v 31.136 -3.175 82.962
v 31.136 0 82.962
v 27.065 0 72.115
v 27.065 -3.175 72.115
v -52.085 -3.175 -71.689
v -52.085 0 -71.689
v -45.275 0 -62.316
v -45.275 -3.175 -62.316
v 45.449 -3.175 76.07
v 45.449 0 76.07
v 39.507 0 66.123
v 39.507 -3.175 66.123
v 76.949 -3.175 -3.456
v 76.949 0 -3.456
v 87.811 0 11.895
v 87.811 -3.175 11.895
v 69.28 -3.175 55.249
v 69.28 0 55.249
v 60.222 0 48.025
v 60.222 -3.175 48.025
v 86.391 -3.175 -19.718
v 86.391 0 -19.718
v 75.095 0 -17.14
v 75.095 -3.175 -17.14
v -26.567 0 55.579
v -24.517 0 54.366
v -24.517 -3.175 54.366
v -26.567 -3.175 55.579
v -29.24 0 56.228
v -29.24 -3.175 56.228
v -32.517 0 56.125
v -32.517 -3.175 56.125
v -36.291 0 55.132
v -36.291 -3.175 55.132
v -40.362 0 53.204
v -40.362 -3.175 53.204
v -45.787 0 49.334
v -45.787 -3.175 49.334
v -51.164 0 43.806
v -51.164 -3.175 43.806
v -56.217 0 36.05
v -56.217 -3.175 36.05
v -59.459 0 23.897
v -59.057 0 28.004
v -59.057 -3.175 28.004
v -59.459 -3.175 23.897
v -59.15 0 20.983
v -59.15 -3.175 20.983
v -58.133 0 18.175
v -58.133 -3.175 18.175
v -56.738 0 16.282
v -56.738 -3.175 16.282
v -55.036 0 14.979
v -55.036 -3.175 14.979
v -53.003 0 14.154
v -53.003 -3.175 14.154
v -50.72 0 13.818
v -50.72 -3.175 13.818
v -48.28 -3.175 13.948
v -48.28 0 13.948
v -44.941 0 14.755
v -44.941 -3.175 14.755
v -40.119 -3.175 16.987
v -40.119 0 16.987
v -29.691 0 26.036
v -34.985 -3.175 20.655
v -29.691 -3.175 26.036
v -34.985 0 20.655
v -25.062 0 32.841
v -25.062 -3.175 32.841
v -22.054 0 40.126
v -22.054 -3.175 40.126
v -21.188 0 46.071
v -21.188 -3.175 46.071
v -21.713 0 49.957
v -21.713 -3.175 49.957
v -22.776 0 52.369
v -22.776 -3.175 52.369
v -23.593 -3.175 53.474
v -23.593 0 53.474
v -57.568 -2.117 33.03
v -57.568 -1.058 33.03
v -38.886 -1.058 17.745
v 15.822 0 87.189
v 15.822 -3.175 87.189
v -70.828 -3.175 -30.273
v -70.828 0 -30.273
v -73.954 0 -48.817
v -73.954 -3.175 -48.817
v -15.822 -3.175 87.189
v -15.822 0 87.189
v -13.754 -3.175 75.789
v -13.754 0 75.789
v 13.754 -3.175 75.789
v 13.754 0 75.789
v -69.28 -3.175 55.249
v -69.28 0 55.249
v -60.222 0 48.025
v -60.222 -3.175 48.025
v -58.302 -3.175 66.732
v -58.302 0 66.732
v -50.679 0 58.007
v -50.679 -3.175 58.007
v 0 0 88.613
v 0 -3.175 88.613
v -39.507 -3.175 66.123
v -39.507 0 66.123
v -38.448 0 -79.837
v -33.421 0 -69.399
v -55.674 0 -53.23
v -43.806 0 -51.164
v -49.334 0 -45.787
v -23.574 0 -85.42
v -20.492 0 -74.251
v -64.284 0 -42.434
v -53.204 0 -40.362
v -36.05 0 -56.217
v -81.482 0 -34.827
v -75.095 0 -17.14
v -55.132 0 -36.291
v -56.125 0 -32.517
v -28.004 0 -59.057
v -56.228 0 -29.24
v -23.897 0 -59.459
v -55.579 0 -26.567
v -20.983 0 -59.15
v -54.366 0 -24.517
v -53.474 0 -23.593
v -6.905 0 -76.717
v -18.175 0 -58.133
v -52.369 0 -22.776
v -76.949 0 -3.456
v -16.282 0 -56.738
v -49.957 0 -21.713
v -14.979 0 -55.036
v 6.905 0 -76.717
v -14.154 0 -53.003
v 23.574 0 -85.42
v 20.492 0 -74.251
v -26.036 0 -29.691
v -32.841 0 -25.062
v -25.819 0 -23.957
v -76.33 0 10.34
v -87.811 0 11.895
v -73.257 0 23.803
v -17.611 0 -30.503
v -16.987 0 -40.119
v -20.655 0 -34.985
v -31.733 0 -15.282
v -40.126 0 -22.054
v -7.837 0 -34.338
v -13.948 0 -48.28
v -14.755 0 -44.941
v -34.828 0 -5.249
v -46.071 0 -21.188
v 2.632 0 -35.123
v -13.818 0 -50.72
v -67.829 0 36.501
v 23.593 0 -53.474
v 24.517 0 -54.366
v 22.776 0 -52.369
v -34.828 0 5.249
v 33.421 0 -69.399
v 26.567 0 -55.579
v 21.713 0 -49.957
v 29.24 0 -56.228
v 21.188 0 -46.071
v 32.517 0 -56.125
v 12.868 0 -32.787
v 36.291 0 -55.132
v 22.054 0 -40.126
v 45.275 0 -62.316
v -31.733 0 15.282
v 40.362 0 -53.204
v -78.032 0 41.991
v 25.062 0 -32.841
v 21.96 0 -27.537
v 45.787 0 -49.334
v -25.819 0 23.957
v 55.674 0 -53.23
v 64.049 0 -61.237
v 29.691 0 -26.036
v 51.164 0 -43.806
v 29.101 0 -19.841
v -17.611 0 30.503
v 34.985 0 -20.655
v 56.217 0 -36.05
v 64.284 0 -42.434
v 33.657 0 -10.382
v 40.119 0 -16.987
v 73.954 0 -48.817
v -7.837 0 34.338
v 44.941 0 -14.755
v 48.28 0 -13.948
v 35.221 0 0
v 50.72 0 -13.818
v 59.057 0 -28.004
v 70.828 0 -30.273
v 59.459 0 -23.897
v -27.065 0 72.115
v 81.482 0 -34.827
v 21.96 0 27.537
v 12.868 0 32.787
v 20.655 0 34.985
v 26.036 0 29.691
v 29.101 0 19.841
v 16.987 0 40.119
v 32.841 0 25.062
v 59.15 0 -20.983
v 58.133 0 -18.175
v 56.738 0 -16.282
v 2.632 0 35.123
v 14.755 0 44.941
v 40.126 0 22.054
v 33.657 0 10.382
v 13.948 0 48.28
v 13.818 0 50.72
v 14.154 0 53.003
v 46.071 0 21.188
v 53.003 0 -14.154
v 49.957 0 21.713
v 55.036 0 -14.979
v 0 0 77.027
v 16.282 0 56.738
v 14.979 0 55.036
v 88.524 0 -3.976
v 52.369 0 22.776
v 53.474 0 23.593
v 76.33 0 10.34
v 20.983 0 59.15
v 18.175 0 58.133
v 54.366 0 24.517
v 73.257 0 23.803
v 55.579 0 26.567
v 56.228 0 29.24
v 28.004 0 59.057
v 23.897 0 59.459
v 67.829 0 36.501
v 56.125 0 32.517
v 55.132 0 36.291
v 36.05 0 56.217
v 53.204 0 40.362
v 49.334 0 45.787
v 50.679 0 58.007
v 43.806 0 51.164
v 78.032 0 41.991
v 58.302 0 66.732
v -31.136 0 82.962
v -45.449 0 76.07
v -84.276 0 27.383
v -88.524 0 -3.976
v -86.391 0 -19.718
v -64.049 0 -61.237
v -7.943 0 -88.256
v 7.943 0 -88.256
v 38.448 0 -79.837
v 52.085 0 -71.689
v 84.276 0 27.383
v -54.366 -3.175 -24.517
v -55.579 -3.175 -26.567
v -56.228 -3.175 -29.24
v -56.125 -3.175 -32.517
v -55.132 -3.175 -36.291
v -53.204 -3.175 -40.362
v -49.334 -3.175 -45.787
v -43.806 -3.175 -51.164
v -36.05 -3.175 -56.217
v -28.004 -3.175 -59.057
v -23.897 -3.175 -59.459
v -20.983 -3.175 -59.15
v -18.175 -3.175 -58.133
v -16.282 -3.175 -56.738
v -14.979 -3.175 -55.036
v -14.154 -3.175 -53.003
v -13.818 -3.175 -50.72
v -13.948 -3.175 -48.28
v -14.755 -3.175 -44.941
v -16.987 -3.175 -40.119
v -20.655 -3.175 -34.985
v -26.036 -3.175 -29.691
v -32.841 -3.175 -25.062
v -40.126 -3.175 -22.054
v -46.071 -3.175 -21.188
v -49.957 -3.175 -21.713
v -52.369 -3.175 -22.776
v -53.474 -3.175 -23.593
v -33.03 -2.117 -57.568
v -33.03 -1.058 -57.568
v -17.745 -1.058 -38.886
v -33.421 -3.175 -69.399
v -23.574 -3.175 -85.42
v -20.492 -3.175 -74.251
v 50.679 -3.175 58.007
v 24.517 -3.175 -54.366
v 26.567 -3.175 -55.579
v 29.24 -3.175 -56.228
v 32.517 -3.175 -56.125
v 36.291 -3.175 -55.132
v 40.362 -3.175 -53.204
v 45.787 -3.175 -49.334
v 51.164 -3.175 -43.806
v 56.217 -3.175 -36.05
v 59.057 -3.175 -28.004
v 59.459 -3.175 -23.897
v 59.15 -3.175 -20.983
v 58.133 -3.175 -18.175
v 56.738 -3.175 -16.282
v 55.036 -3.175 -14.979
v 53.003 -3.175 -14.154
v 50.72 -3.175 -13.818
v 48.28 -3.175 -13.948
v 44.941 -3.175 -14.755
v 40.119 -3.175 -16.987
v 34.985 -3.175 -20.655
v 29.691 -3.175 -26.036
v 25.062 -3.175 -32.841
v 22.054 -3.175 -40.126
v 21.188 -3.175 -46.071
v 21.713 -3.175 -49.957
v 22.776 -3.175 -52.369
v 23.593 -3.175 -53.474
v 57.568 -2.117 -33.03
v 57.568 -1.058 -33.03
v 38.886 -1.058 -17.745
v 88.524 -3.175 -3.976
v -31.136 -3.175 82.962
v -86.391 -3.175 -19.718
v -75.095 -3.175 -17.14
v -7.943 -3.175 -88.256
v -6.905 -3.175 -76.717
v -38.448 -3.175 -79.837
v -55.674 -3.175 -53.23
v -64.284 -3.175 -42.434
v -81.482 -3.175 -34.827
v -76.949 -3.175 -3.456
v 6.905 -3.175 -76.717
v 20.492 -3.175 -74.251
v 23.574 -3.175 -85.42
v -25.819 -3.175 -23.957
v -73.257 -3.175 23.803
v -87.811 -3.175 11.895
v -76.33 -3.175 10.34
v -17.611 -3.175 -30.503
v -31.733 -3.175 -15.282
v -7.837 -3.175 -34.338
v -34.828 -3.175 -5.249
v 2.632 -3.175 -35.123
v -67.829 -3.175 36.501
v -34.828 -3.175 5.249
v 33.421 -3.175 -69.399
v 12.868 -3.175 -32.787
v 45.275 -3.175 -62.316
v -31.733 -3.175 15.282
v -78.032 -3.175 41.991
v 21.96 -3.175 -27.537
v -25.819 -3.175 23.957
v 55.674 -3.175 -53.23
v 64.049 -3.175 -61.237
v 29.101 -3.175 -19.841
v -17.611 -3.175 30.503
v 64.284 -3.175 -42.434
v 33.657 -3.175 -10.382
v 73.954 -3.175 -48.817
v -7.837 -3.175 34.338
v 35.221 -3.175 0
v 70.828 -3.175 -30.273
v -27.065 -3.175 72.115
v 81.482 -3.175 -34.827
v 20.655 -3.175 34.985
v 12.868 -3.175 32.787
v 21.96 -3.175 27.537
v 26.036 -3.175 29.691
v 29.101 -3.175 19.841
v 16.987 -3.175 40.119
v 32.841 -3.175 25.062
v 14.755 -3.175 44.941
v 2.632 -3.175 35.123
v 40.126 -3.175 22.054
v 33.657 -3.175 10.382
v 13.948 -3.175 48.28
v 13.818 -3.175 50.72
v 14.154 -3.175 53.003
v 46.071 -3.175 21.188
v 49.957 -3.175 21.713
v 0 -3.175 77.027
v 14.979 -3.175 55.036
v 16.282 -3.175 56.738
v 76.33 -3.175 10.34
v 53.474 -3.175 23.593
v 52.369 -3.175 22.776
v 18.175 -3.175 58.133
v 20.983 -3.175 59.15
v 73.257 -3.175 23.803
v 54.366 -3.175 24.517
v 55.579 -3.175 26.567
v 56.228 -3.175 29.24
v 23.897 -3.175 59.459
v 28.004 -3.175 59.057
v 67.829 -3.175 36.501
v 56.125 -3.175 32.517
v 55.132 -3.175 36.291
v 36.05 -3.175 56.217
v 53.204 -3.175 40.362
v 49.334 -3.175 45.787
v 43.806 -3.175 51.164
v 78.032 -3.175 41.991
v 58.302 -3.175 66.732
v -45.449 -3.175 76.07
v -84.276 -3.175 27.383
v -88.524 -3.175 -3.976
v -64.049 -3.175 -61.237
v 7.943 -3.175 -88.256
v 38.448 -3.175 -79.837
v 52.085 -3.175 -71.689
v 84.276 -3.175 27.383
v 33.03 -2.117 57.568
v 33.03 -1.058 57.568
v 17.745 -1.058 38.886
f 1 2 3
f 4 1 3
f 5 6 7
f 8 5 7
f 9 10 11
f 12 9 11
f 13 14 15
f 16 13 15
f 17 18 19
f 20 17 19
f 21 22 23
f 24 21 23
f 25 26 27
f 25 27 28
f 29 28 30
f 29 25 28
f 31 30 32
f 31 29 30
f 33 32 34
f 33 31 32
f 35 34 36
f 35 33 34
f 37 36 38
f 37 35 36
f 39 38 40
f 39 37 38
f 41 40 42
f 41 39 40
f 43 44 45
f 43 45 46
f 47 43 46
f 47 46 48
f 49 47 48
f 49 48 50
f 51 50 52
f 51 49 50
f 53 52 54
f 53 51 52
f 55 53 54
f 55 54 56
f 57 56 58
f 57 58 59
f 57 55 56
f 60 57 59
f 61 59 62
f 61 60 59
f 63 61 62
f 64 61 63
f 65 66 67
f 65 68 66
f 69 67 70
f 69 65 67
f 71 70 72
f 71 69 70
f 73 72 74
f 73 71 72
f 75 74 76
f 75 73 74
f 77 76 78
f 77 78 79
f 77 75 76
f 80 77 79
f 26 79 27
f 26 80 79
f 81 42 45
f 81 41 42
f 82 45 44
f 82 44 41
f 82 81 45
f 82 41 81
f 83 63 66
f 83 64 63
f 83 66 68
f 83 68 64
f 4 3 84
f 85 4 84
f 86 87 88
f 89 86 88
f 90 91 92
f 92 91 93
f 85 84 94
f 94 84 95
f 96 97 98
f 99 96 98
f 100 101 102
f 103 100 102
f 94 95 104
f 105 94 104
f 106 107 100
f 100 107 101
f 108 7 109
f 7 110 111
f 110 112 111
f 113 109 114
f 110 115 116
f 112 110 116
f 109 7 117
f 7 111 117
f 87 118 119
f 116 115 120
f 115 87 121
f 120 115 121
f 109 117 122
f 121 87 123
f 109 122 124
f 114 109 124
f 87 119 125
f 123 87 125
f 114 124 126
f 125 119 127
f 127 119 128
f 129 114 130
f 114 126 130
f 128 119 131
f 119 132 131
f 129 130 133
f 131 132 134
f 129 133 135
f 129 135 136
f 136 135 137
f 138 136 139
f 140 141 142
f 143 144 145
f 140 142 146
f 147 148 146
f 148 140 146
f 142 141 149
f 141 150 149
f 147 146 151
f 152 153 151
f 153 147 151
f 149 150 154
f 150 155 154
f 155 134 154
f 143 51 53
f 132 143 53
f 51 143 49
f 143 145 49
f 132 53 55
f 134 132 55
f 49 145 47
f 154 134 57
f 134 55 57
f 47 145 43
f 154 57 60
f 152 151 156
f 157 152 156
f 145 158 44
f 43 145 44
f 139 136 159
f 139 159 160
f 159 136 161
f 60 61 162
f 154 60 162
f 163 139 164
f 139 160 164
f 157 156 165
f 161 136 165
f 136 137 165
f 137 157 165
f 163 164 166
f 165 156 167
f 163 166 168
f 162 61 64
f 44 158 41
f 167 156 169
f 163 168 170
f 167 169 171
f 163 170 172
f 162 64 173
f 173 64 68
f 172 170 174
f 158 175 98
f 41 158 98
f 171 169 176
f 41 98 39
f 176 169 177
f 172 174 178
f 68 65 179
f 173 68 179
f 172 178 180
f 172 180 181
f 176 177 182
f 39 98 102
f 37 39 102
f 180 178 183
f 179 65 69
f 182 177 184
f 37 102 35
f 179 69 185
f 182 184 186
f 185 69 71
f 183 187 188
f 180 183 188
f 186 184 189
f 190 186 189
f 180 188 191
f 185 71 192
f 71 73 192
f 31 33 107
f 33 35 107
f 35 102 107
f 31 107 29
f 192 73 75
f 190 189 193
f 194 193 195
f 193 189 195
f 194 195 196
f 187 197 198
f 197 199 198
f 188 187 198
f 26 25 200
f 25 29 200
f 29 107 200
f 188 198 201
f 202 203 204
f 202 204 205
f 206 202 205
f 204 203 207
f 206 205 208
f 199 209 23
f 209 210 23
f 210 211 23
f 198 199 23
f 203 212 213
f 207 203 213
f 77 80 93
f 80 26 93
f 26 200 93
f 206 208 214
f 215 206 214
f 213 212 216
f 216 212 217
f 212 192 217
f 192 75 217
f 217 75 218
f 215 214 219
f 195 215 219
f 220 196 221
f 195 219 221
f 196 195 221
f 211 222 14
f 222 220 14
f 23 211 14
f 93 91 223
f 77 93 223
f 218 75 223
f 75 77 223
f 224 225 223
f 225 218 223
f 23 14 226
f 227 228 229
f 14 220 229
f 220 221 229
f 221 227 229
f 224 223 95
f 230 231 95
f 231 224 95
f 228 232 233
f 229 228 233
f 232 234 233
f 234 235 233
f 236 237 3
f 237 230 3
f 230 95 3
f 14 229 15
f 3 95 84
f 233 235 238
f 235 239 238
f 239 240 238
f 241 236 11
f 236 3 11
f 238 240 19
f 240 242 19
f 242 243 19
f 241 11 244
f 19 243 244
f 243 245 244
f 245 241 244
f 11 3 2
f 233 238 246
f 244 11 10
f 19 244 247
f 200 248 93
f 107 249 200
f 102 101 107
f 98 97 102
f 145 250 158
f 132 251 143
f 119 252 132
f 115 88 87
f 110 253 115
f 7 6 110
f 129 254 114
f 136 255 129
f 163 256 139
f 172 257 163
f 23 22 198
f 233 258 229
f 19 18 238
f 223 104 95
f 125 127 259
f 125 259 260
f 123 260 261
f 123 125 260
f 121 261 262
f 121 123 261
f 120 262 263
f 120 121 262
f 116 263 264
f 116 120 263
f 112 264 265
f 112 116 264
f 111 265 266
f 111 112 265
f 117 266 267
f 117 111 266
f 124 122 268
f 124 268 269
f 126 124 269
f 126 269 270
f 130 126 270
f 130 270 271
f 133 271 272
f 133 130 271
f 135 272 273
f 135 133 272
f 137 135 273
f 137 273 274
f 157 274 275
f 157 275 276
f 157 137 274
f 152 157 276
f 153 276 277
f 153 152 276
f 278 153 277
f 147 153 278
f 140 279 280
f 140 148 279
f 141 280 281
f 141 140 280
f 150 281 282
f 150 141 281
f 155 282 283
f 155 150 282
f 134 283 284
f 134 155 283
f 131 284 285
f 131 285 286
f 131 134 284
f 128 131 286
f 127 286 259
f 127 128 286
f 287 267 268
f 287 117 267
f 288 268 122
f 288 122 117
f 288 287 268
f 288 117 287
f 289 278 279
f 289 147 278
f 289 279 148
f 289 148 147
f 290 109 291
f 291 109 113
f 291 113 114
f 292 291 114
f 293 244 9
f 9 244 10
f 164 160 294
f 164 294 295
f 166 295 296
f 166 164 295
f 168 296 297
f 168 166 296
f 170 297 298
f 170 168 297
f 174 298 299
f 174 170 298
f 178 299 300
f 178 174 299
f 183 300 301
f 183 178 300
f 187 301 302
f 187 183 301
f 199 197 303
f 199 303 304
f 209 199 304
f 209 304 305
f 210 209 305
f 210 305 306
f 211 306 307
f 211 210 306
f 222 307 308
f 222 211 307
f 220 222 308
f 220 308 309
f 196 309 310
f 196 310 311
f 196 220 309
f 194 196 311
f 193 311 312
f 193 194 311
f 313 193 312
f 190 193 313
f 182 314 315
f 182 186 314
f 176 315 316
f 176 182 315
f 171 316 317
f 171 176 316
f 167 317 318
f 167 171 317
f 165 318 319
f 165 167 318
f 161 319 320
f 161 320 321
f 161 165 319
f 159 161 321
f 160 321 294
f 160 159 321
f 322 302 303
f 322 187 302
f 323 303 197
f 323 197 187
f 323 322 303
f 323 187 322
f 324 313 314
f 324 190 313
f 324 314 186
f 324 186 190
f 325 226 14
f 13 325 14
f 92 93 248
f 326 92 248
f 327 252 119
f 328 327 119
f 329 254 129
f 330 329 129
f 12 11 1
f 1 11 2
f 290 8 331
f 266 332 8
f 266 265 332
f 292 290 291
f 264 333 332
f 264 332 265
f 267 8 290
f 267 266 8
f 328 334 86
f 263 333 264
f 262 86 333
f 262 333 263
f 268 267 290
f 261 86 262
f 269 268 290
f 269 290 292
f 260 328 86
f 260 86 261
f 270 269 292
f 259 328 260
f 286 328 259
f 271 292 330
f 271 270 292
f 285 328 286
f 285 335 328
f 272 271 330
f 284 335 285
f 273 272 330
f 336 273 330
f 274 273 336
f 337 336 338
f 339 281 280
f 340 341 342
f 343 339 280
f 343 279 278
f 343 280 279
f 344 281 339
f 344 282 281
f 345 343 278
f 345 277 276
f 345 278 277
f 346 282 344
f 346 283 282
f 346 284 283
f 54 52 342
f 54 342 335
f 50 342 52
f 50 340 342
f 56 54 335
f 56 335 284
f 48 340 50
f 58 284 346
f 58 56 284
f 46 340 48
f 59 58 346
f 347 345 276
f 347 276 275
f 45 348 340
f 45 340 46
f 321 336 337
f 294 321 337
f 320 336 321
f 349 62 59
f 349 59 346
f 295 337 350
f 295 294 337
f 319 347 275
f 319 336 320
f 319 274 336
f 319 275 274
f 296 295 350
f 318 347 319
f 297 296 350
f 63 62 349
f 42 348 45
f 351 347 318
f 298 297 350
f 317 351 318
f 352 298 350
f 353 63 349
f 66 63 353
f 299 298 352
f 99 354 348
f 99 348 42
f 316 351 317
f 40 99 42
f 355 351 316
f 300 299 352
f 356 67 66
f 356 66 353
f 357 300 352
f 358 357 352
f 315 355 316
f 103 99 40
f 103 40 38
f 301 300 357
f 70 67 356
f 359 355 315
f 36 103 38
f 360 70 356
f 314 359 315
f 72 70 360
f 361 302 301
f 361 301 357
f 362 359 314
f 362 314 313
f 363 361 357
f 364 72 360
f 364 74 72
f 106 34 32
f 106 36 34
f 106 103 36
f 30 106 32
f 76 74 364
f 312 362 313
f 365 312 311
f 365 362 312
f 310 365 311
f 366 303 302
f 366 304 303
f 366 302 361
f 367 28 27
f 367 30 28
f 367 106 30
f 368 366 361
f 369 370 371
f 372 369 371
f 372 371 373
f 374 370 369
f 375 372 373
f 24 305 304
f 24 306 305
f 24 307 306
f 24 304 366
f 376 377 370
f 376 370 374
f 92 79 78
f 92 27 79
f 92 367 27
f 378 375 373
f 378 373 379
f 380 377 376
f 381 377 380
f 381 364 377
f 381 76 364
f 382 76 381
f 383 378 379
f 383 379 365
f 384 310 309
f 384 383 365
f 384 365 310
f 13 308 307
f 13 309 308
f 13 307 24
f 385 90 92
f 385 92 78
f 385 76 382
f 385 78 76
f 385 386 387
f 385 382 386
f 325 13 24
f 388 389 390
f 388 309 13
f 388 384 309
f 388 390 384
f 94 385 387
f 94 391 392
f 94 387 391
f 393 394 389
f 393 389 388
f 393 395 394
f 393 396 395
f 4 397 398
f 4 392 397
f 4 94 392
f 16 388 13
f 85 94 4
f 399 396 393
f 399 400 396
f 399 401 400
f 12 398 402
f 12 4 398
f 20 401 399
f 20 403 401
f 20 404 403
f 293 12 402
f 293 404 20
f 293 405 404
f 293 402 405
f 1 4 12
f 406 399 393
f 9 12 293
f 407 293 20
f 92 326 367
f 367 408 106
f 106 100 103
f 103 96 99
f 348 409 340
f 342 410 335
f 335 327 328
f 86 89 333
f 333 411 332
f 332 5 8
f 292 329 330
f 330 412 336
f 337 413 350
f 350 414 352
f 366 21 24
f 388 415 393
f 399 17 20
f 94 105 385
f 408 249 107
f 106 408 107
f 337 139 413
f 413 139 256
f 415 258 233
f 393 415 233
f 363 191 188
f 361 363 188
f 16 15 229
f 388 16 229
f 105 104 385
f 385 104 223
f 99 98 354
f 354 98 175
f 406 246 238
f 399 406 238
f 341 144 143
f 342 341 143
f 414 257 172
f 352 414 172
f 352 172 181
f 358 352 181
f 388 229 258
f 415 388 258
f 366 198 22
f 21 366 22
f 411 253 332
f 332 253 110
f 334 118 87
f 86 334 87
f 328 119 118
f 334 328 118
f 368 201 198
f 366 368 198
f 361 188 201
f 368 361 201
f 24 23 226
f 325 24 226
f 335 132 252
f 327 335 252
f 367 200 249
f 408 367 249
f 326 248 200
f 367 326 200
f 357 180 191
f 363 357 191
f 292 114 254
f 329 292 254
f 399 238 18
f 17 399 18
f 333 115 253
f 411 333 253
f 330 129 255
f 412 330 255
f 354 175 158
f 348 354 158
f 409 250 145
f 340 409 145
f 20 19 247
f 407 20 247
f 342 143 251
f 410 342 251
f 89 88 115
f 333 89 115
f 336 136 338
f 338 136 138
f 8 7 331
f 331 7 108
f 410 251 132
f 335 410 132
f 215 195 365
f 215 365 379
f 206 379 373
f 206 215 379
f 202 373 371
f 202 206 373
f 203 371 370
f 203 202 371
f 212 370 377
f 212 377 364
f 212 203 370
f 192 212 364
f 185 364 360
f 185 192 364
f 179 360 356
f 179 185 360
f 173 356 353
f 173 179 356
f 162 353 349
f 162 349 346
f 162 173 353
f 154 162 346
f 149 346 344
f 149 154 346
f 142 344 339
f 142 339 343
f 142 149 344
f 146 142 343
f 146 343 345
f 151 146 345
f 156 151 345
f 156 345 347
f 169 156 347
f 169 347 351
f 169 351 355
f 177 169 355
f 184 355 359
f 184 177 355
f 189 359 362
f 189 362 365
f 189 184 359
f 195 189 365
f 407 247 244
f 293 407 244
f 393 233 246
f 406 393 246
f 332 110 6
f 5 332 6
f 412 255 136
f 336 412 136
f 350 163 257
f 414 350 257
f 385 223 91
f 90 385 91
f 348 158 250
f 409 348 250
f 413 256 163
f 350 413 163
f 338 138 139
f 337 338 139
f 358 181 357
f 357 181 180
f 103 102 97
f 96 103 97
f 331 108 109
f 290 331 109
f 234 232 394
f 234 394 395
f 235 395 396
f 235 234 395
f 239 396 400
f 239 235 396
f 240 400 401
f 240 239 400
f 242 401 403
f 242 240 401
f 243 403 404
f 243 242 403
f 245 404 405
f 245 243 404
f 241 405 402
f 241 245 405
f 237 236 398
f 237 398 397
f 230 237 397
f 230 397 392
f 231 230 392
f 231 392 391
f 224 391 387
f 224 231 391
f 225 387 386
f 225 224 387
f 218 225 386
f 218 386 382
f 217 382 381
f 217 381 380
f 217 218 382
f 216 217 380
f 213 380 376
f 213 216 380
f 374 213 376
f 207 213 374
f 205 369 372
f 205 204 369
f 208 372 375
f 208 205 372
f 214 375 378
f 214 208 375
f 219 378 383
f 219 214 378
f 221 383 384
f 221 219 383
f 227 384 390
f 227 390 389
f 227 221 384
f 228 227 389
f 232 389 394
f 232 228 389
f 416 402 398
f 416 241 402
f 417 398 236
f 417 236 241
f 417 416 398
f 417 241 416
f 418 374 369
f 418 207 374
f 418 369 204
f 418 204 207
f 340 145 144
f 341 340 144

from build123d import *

# Parameters (mm, degrees)
F0_R     = 35.2214
F1_DEPTH = 3.175


with BuildPart() as f1:
    # F0 (on Front) → F1 (new body)
    with BuildSketch(Plane.XZ):
        Polygon((0, 88.612877), (0, 77.026623), (-15.82244, 87.188831), (-13.753635, 75.788774), (-31.136334, 82.962465), (-27.065216, 72.115011), (-45.44948, 76.069617), (-39.506899, 66.123412), (-58.301843, 66.731829), (-50.678798, 58.006552), (-69.280337, 55.249225), (-60.221839, 48.025314), (-78.032103, 41.990865), (-67.8293, 36.500503), (-84.275854, 27.382885), (-73.256672, 23.802536), (-87.810909, 11.894796), (-76.329514, 10.339535), (-88.52365, -3.975602), (-76.949063, -3.455786), (-86.391167, -19.71822), (-75.095405, -17.140036), (-81.482001, -34.827079), (-70.828119, -30.273391), (-73.953937, -48.816566), (-64.28436, -42.433734), (-64.048932, -61.237049), (-55.674448, -53.230222), (-52.085342, -71.689323), (-45.275113, -62.315847), (-38.447686, -79.837443), (-33.420599, -69.39859), (-23.57429, -85.419522), (-20.49192, -74.250804), (-7.943197, -88.256147), (-6.904613, -76.716537), (7.943197, -88.256147), (6.904613, -76.716537), (23.57429, -85.419522), (20.49192, -74.250804), (38.447686, -79.837443), (33.420599, -69.39859), (52.085342, -71.689323), (45.275113, -62.315847), (64.048932, -61.237049), (55.674448, -53.230222), (73.953937, -48.816566), (64.28436, -42.433734), (81.482001, -34.827079), (70.828119, -30.273391), (86.391167, -19.71822), (75.095405, -17.140036), (88.52365, -3.975602), (76.949063, -3.455786), (87.810909, 11.894796), (76.329514, 10.339535), (84.275854, 27.382885), (73.256672, 23.802536), (78.032103, 41.990865), (67.8293, 36.500503), (69.280337, 55.249225), (60.221839, 48.025314), (58.301843, 66.731829), (50.678798, 58.006552), (45.44948, 76.069617), (39.506899, 66.123412), (31.136334, 82.962465), (27.065216, 72.115011), (15.82244, 87.188831), (13.753635, 75.788774), align=None)
        with BuildLine():
            add(Edge.make_bspline(
                [(-54.365881, -24.517354), (-69.651304, -43.199543), (-33.030369, -57.567896), (3.590565, -71.93625), (-17.744946, -38.885707), (-39.080458, -5.835164), (-54.365881, -24.517354)],
                knots=[0, 0, 0, 2.094395, 2.094395, 4.18879, 4.18879, 6.283185, 6.283185, 6.283185], degree=2, weights=[1, 0.5, 1, 0.5, 1, 0.5, 1]))
        make_face(mode=Mode.SUBTRACT)
        with BuildLine():
            add(Edge.make_bspline(
                [(24.517354, -54.365881), (43.199543, -69.651304), (57.567896, -33.030369), (71.93625, 3.590565), (38.885707, -17.744946), (5.835164, -39.080458), (24.517354, -54.365881)],
                knots=[0, 0, 0, 2.094395, 2.094395, 4.18879, 4.18879, 6.283185, 6.283185, 6.283185], degree=2, weights=[1, 0.5, 1, 0.5, 1, 0.5, 1]))
        make_face(mode=Mode.SUBTRACT)
        Circle(F0_R, mode=Mode.SUBTRACT)
        with BuildLine():
            add(Edge.make_bspline(
                [(-24.517354, 54.365881), (-43.199543, 69.651304), (-57.567896, 33.030369), (-71.93625, -3.590565), (-38.885707, 17.744946), (-5.835164, 39.080458), (-24.517354, 54.365881)],
                knots=[0, 0, 0, 2.094395, 2.094395, 4.18879, 4.18879, 6.283185, 6.283185, 6.283185], degree=2, weights=[1, 0.5, 1, 0.5, 1, 0.5, 1]))
        make_face(mode=Mode.SUBTRACT)
        with BuildLine():
            add(Edge.make_bspline(
                [(54.365881, 24.517354), (69.651304, 43.199543), (33.030369, 57.567896), (-3.590565, 71.93625), (17.744946, 38.885707), (39.080458, 5.835164), (54.365881, 24.517354)],
                knots=[0, 0, 0, 2.094395, 2.094395, 4.18879, 4.18879, 6.283185, 6.283185, 6.283185], degree=2, weights=[1, 0.5, 1, 0.5, 1, 0.5, 1]))
        make_face(mode=Mode.SUBTRACT)
    extrude(amount=F1_DEPTH)


solid = f1.part
